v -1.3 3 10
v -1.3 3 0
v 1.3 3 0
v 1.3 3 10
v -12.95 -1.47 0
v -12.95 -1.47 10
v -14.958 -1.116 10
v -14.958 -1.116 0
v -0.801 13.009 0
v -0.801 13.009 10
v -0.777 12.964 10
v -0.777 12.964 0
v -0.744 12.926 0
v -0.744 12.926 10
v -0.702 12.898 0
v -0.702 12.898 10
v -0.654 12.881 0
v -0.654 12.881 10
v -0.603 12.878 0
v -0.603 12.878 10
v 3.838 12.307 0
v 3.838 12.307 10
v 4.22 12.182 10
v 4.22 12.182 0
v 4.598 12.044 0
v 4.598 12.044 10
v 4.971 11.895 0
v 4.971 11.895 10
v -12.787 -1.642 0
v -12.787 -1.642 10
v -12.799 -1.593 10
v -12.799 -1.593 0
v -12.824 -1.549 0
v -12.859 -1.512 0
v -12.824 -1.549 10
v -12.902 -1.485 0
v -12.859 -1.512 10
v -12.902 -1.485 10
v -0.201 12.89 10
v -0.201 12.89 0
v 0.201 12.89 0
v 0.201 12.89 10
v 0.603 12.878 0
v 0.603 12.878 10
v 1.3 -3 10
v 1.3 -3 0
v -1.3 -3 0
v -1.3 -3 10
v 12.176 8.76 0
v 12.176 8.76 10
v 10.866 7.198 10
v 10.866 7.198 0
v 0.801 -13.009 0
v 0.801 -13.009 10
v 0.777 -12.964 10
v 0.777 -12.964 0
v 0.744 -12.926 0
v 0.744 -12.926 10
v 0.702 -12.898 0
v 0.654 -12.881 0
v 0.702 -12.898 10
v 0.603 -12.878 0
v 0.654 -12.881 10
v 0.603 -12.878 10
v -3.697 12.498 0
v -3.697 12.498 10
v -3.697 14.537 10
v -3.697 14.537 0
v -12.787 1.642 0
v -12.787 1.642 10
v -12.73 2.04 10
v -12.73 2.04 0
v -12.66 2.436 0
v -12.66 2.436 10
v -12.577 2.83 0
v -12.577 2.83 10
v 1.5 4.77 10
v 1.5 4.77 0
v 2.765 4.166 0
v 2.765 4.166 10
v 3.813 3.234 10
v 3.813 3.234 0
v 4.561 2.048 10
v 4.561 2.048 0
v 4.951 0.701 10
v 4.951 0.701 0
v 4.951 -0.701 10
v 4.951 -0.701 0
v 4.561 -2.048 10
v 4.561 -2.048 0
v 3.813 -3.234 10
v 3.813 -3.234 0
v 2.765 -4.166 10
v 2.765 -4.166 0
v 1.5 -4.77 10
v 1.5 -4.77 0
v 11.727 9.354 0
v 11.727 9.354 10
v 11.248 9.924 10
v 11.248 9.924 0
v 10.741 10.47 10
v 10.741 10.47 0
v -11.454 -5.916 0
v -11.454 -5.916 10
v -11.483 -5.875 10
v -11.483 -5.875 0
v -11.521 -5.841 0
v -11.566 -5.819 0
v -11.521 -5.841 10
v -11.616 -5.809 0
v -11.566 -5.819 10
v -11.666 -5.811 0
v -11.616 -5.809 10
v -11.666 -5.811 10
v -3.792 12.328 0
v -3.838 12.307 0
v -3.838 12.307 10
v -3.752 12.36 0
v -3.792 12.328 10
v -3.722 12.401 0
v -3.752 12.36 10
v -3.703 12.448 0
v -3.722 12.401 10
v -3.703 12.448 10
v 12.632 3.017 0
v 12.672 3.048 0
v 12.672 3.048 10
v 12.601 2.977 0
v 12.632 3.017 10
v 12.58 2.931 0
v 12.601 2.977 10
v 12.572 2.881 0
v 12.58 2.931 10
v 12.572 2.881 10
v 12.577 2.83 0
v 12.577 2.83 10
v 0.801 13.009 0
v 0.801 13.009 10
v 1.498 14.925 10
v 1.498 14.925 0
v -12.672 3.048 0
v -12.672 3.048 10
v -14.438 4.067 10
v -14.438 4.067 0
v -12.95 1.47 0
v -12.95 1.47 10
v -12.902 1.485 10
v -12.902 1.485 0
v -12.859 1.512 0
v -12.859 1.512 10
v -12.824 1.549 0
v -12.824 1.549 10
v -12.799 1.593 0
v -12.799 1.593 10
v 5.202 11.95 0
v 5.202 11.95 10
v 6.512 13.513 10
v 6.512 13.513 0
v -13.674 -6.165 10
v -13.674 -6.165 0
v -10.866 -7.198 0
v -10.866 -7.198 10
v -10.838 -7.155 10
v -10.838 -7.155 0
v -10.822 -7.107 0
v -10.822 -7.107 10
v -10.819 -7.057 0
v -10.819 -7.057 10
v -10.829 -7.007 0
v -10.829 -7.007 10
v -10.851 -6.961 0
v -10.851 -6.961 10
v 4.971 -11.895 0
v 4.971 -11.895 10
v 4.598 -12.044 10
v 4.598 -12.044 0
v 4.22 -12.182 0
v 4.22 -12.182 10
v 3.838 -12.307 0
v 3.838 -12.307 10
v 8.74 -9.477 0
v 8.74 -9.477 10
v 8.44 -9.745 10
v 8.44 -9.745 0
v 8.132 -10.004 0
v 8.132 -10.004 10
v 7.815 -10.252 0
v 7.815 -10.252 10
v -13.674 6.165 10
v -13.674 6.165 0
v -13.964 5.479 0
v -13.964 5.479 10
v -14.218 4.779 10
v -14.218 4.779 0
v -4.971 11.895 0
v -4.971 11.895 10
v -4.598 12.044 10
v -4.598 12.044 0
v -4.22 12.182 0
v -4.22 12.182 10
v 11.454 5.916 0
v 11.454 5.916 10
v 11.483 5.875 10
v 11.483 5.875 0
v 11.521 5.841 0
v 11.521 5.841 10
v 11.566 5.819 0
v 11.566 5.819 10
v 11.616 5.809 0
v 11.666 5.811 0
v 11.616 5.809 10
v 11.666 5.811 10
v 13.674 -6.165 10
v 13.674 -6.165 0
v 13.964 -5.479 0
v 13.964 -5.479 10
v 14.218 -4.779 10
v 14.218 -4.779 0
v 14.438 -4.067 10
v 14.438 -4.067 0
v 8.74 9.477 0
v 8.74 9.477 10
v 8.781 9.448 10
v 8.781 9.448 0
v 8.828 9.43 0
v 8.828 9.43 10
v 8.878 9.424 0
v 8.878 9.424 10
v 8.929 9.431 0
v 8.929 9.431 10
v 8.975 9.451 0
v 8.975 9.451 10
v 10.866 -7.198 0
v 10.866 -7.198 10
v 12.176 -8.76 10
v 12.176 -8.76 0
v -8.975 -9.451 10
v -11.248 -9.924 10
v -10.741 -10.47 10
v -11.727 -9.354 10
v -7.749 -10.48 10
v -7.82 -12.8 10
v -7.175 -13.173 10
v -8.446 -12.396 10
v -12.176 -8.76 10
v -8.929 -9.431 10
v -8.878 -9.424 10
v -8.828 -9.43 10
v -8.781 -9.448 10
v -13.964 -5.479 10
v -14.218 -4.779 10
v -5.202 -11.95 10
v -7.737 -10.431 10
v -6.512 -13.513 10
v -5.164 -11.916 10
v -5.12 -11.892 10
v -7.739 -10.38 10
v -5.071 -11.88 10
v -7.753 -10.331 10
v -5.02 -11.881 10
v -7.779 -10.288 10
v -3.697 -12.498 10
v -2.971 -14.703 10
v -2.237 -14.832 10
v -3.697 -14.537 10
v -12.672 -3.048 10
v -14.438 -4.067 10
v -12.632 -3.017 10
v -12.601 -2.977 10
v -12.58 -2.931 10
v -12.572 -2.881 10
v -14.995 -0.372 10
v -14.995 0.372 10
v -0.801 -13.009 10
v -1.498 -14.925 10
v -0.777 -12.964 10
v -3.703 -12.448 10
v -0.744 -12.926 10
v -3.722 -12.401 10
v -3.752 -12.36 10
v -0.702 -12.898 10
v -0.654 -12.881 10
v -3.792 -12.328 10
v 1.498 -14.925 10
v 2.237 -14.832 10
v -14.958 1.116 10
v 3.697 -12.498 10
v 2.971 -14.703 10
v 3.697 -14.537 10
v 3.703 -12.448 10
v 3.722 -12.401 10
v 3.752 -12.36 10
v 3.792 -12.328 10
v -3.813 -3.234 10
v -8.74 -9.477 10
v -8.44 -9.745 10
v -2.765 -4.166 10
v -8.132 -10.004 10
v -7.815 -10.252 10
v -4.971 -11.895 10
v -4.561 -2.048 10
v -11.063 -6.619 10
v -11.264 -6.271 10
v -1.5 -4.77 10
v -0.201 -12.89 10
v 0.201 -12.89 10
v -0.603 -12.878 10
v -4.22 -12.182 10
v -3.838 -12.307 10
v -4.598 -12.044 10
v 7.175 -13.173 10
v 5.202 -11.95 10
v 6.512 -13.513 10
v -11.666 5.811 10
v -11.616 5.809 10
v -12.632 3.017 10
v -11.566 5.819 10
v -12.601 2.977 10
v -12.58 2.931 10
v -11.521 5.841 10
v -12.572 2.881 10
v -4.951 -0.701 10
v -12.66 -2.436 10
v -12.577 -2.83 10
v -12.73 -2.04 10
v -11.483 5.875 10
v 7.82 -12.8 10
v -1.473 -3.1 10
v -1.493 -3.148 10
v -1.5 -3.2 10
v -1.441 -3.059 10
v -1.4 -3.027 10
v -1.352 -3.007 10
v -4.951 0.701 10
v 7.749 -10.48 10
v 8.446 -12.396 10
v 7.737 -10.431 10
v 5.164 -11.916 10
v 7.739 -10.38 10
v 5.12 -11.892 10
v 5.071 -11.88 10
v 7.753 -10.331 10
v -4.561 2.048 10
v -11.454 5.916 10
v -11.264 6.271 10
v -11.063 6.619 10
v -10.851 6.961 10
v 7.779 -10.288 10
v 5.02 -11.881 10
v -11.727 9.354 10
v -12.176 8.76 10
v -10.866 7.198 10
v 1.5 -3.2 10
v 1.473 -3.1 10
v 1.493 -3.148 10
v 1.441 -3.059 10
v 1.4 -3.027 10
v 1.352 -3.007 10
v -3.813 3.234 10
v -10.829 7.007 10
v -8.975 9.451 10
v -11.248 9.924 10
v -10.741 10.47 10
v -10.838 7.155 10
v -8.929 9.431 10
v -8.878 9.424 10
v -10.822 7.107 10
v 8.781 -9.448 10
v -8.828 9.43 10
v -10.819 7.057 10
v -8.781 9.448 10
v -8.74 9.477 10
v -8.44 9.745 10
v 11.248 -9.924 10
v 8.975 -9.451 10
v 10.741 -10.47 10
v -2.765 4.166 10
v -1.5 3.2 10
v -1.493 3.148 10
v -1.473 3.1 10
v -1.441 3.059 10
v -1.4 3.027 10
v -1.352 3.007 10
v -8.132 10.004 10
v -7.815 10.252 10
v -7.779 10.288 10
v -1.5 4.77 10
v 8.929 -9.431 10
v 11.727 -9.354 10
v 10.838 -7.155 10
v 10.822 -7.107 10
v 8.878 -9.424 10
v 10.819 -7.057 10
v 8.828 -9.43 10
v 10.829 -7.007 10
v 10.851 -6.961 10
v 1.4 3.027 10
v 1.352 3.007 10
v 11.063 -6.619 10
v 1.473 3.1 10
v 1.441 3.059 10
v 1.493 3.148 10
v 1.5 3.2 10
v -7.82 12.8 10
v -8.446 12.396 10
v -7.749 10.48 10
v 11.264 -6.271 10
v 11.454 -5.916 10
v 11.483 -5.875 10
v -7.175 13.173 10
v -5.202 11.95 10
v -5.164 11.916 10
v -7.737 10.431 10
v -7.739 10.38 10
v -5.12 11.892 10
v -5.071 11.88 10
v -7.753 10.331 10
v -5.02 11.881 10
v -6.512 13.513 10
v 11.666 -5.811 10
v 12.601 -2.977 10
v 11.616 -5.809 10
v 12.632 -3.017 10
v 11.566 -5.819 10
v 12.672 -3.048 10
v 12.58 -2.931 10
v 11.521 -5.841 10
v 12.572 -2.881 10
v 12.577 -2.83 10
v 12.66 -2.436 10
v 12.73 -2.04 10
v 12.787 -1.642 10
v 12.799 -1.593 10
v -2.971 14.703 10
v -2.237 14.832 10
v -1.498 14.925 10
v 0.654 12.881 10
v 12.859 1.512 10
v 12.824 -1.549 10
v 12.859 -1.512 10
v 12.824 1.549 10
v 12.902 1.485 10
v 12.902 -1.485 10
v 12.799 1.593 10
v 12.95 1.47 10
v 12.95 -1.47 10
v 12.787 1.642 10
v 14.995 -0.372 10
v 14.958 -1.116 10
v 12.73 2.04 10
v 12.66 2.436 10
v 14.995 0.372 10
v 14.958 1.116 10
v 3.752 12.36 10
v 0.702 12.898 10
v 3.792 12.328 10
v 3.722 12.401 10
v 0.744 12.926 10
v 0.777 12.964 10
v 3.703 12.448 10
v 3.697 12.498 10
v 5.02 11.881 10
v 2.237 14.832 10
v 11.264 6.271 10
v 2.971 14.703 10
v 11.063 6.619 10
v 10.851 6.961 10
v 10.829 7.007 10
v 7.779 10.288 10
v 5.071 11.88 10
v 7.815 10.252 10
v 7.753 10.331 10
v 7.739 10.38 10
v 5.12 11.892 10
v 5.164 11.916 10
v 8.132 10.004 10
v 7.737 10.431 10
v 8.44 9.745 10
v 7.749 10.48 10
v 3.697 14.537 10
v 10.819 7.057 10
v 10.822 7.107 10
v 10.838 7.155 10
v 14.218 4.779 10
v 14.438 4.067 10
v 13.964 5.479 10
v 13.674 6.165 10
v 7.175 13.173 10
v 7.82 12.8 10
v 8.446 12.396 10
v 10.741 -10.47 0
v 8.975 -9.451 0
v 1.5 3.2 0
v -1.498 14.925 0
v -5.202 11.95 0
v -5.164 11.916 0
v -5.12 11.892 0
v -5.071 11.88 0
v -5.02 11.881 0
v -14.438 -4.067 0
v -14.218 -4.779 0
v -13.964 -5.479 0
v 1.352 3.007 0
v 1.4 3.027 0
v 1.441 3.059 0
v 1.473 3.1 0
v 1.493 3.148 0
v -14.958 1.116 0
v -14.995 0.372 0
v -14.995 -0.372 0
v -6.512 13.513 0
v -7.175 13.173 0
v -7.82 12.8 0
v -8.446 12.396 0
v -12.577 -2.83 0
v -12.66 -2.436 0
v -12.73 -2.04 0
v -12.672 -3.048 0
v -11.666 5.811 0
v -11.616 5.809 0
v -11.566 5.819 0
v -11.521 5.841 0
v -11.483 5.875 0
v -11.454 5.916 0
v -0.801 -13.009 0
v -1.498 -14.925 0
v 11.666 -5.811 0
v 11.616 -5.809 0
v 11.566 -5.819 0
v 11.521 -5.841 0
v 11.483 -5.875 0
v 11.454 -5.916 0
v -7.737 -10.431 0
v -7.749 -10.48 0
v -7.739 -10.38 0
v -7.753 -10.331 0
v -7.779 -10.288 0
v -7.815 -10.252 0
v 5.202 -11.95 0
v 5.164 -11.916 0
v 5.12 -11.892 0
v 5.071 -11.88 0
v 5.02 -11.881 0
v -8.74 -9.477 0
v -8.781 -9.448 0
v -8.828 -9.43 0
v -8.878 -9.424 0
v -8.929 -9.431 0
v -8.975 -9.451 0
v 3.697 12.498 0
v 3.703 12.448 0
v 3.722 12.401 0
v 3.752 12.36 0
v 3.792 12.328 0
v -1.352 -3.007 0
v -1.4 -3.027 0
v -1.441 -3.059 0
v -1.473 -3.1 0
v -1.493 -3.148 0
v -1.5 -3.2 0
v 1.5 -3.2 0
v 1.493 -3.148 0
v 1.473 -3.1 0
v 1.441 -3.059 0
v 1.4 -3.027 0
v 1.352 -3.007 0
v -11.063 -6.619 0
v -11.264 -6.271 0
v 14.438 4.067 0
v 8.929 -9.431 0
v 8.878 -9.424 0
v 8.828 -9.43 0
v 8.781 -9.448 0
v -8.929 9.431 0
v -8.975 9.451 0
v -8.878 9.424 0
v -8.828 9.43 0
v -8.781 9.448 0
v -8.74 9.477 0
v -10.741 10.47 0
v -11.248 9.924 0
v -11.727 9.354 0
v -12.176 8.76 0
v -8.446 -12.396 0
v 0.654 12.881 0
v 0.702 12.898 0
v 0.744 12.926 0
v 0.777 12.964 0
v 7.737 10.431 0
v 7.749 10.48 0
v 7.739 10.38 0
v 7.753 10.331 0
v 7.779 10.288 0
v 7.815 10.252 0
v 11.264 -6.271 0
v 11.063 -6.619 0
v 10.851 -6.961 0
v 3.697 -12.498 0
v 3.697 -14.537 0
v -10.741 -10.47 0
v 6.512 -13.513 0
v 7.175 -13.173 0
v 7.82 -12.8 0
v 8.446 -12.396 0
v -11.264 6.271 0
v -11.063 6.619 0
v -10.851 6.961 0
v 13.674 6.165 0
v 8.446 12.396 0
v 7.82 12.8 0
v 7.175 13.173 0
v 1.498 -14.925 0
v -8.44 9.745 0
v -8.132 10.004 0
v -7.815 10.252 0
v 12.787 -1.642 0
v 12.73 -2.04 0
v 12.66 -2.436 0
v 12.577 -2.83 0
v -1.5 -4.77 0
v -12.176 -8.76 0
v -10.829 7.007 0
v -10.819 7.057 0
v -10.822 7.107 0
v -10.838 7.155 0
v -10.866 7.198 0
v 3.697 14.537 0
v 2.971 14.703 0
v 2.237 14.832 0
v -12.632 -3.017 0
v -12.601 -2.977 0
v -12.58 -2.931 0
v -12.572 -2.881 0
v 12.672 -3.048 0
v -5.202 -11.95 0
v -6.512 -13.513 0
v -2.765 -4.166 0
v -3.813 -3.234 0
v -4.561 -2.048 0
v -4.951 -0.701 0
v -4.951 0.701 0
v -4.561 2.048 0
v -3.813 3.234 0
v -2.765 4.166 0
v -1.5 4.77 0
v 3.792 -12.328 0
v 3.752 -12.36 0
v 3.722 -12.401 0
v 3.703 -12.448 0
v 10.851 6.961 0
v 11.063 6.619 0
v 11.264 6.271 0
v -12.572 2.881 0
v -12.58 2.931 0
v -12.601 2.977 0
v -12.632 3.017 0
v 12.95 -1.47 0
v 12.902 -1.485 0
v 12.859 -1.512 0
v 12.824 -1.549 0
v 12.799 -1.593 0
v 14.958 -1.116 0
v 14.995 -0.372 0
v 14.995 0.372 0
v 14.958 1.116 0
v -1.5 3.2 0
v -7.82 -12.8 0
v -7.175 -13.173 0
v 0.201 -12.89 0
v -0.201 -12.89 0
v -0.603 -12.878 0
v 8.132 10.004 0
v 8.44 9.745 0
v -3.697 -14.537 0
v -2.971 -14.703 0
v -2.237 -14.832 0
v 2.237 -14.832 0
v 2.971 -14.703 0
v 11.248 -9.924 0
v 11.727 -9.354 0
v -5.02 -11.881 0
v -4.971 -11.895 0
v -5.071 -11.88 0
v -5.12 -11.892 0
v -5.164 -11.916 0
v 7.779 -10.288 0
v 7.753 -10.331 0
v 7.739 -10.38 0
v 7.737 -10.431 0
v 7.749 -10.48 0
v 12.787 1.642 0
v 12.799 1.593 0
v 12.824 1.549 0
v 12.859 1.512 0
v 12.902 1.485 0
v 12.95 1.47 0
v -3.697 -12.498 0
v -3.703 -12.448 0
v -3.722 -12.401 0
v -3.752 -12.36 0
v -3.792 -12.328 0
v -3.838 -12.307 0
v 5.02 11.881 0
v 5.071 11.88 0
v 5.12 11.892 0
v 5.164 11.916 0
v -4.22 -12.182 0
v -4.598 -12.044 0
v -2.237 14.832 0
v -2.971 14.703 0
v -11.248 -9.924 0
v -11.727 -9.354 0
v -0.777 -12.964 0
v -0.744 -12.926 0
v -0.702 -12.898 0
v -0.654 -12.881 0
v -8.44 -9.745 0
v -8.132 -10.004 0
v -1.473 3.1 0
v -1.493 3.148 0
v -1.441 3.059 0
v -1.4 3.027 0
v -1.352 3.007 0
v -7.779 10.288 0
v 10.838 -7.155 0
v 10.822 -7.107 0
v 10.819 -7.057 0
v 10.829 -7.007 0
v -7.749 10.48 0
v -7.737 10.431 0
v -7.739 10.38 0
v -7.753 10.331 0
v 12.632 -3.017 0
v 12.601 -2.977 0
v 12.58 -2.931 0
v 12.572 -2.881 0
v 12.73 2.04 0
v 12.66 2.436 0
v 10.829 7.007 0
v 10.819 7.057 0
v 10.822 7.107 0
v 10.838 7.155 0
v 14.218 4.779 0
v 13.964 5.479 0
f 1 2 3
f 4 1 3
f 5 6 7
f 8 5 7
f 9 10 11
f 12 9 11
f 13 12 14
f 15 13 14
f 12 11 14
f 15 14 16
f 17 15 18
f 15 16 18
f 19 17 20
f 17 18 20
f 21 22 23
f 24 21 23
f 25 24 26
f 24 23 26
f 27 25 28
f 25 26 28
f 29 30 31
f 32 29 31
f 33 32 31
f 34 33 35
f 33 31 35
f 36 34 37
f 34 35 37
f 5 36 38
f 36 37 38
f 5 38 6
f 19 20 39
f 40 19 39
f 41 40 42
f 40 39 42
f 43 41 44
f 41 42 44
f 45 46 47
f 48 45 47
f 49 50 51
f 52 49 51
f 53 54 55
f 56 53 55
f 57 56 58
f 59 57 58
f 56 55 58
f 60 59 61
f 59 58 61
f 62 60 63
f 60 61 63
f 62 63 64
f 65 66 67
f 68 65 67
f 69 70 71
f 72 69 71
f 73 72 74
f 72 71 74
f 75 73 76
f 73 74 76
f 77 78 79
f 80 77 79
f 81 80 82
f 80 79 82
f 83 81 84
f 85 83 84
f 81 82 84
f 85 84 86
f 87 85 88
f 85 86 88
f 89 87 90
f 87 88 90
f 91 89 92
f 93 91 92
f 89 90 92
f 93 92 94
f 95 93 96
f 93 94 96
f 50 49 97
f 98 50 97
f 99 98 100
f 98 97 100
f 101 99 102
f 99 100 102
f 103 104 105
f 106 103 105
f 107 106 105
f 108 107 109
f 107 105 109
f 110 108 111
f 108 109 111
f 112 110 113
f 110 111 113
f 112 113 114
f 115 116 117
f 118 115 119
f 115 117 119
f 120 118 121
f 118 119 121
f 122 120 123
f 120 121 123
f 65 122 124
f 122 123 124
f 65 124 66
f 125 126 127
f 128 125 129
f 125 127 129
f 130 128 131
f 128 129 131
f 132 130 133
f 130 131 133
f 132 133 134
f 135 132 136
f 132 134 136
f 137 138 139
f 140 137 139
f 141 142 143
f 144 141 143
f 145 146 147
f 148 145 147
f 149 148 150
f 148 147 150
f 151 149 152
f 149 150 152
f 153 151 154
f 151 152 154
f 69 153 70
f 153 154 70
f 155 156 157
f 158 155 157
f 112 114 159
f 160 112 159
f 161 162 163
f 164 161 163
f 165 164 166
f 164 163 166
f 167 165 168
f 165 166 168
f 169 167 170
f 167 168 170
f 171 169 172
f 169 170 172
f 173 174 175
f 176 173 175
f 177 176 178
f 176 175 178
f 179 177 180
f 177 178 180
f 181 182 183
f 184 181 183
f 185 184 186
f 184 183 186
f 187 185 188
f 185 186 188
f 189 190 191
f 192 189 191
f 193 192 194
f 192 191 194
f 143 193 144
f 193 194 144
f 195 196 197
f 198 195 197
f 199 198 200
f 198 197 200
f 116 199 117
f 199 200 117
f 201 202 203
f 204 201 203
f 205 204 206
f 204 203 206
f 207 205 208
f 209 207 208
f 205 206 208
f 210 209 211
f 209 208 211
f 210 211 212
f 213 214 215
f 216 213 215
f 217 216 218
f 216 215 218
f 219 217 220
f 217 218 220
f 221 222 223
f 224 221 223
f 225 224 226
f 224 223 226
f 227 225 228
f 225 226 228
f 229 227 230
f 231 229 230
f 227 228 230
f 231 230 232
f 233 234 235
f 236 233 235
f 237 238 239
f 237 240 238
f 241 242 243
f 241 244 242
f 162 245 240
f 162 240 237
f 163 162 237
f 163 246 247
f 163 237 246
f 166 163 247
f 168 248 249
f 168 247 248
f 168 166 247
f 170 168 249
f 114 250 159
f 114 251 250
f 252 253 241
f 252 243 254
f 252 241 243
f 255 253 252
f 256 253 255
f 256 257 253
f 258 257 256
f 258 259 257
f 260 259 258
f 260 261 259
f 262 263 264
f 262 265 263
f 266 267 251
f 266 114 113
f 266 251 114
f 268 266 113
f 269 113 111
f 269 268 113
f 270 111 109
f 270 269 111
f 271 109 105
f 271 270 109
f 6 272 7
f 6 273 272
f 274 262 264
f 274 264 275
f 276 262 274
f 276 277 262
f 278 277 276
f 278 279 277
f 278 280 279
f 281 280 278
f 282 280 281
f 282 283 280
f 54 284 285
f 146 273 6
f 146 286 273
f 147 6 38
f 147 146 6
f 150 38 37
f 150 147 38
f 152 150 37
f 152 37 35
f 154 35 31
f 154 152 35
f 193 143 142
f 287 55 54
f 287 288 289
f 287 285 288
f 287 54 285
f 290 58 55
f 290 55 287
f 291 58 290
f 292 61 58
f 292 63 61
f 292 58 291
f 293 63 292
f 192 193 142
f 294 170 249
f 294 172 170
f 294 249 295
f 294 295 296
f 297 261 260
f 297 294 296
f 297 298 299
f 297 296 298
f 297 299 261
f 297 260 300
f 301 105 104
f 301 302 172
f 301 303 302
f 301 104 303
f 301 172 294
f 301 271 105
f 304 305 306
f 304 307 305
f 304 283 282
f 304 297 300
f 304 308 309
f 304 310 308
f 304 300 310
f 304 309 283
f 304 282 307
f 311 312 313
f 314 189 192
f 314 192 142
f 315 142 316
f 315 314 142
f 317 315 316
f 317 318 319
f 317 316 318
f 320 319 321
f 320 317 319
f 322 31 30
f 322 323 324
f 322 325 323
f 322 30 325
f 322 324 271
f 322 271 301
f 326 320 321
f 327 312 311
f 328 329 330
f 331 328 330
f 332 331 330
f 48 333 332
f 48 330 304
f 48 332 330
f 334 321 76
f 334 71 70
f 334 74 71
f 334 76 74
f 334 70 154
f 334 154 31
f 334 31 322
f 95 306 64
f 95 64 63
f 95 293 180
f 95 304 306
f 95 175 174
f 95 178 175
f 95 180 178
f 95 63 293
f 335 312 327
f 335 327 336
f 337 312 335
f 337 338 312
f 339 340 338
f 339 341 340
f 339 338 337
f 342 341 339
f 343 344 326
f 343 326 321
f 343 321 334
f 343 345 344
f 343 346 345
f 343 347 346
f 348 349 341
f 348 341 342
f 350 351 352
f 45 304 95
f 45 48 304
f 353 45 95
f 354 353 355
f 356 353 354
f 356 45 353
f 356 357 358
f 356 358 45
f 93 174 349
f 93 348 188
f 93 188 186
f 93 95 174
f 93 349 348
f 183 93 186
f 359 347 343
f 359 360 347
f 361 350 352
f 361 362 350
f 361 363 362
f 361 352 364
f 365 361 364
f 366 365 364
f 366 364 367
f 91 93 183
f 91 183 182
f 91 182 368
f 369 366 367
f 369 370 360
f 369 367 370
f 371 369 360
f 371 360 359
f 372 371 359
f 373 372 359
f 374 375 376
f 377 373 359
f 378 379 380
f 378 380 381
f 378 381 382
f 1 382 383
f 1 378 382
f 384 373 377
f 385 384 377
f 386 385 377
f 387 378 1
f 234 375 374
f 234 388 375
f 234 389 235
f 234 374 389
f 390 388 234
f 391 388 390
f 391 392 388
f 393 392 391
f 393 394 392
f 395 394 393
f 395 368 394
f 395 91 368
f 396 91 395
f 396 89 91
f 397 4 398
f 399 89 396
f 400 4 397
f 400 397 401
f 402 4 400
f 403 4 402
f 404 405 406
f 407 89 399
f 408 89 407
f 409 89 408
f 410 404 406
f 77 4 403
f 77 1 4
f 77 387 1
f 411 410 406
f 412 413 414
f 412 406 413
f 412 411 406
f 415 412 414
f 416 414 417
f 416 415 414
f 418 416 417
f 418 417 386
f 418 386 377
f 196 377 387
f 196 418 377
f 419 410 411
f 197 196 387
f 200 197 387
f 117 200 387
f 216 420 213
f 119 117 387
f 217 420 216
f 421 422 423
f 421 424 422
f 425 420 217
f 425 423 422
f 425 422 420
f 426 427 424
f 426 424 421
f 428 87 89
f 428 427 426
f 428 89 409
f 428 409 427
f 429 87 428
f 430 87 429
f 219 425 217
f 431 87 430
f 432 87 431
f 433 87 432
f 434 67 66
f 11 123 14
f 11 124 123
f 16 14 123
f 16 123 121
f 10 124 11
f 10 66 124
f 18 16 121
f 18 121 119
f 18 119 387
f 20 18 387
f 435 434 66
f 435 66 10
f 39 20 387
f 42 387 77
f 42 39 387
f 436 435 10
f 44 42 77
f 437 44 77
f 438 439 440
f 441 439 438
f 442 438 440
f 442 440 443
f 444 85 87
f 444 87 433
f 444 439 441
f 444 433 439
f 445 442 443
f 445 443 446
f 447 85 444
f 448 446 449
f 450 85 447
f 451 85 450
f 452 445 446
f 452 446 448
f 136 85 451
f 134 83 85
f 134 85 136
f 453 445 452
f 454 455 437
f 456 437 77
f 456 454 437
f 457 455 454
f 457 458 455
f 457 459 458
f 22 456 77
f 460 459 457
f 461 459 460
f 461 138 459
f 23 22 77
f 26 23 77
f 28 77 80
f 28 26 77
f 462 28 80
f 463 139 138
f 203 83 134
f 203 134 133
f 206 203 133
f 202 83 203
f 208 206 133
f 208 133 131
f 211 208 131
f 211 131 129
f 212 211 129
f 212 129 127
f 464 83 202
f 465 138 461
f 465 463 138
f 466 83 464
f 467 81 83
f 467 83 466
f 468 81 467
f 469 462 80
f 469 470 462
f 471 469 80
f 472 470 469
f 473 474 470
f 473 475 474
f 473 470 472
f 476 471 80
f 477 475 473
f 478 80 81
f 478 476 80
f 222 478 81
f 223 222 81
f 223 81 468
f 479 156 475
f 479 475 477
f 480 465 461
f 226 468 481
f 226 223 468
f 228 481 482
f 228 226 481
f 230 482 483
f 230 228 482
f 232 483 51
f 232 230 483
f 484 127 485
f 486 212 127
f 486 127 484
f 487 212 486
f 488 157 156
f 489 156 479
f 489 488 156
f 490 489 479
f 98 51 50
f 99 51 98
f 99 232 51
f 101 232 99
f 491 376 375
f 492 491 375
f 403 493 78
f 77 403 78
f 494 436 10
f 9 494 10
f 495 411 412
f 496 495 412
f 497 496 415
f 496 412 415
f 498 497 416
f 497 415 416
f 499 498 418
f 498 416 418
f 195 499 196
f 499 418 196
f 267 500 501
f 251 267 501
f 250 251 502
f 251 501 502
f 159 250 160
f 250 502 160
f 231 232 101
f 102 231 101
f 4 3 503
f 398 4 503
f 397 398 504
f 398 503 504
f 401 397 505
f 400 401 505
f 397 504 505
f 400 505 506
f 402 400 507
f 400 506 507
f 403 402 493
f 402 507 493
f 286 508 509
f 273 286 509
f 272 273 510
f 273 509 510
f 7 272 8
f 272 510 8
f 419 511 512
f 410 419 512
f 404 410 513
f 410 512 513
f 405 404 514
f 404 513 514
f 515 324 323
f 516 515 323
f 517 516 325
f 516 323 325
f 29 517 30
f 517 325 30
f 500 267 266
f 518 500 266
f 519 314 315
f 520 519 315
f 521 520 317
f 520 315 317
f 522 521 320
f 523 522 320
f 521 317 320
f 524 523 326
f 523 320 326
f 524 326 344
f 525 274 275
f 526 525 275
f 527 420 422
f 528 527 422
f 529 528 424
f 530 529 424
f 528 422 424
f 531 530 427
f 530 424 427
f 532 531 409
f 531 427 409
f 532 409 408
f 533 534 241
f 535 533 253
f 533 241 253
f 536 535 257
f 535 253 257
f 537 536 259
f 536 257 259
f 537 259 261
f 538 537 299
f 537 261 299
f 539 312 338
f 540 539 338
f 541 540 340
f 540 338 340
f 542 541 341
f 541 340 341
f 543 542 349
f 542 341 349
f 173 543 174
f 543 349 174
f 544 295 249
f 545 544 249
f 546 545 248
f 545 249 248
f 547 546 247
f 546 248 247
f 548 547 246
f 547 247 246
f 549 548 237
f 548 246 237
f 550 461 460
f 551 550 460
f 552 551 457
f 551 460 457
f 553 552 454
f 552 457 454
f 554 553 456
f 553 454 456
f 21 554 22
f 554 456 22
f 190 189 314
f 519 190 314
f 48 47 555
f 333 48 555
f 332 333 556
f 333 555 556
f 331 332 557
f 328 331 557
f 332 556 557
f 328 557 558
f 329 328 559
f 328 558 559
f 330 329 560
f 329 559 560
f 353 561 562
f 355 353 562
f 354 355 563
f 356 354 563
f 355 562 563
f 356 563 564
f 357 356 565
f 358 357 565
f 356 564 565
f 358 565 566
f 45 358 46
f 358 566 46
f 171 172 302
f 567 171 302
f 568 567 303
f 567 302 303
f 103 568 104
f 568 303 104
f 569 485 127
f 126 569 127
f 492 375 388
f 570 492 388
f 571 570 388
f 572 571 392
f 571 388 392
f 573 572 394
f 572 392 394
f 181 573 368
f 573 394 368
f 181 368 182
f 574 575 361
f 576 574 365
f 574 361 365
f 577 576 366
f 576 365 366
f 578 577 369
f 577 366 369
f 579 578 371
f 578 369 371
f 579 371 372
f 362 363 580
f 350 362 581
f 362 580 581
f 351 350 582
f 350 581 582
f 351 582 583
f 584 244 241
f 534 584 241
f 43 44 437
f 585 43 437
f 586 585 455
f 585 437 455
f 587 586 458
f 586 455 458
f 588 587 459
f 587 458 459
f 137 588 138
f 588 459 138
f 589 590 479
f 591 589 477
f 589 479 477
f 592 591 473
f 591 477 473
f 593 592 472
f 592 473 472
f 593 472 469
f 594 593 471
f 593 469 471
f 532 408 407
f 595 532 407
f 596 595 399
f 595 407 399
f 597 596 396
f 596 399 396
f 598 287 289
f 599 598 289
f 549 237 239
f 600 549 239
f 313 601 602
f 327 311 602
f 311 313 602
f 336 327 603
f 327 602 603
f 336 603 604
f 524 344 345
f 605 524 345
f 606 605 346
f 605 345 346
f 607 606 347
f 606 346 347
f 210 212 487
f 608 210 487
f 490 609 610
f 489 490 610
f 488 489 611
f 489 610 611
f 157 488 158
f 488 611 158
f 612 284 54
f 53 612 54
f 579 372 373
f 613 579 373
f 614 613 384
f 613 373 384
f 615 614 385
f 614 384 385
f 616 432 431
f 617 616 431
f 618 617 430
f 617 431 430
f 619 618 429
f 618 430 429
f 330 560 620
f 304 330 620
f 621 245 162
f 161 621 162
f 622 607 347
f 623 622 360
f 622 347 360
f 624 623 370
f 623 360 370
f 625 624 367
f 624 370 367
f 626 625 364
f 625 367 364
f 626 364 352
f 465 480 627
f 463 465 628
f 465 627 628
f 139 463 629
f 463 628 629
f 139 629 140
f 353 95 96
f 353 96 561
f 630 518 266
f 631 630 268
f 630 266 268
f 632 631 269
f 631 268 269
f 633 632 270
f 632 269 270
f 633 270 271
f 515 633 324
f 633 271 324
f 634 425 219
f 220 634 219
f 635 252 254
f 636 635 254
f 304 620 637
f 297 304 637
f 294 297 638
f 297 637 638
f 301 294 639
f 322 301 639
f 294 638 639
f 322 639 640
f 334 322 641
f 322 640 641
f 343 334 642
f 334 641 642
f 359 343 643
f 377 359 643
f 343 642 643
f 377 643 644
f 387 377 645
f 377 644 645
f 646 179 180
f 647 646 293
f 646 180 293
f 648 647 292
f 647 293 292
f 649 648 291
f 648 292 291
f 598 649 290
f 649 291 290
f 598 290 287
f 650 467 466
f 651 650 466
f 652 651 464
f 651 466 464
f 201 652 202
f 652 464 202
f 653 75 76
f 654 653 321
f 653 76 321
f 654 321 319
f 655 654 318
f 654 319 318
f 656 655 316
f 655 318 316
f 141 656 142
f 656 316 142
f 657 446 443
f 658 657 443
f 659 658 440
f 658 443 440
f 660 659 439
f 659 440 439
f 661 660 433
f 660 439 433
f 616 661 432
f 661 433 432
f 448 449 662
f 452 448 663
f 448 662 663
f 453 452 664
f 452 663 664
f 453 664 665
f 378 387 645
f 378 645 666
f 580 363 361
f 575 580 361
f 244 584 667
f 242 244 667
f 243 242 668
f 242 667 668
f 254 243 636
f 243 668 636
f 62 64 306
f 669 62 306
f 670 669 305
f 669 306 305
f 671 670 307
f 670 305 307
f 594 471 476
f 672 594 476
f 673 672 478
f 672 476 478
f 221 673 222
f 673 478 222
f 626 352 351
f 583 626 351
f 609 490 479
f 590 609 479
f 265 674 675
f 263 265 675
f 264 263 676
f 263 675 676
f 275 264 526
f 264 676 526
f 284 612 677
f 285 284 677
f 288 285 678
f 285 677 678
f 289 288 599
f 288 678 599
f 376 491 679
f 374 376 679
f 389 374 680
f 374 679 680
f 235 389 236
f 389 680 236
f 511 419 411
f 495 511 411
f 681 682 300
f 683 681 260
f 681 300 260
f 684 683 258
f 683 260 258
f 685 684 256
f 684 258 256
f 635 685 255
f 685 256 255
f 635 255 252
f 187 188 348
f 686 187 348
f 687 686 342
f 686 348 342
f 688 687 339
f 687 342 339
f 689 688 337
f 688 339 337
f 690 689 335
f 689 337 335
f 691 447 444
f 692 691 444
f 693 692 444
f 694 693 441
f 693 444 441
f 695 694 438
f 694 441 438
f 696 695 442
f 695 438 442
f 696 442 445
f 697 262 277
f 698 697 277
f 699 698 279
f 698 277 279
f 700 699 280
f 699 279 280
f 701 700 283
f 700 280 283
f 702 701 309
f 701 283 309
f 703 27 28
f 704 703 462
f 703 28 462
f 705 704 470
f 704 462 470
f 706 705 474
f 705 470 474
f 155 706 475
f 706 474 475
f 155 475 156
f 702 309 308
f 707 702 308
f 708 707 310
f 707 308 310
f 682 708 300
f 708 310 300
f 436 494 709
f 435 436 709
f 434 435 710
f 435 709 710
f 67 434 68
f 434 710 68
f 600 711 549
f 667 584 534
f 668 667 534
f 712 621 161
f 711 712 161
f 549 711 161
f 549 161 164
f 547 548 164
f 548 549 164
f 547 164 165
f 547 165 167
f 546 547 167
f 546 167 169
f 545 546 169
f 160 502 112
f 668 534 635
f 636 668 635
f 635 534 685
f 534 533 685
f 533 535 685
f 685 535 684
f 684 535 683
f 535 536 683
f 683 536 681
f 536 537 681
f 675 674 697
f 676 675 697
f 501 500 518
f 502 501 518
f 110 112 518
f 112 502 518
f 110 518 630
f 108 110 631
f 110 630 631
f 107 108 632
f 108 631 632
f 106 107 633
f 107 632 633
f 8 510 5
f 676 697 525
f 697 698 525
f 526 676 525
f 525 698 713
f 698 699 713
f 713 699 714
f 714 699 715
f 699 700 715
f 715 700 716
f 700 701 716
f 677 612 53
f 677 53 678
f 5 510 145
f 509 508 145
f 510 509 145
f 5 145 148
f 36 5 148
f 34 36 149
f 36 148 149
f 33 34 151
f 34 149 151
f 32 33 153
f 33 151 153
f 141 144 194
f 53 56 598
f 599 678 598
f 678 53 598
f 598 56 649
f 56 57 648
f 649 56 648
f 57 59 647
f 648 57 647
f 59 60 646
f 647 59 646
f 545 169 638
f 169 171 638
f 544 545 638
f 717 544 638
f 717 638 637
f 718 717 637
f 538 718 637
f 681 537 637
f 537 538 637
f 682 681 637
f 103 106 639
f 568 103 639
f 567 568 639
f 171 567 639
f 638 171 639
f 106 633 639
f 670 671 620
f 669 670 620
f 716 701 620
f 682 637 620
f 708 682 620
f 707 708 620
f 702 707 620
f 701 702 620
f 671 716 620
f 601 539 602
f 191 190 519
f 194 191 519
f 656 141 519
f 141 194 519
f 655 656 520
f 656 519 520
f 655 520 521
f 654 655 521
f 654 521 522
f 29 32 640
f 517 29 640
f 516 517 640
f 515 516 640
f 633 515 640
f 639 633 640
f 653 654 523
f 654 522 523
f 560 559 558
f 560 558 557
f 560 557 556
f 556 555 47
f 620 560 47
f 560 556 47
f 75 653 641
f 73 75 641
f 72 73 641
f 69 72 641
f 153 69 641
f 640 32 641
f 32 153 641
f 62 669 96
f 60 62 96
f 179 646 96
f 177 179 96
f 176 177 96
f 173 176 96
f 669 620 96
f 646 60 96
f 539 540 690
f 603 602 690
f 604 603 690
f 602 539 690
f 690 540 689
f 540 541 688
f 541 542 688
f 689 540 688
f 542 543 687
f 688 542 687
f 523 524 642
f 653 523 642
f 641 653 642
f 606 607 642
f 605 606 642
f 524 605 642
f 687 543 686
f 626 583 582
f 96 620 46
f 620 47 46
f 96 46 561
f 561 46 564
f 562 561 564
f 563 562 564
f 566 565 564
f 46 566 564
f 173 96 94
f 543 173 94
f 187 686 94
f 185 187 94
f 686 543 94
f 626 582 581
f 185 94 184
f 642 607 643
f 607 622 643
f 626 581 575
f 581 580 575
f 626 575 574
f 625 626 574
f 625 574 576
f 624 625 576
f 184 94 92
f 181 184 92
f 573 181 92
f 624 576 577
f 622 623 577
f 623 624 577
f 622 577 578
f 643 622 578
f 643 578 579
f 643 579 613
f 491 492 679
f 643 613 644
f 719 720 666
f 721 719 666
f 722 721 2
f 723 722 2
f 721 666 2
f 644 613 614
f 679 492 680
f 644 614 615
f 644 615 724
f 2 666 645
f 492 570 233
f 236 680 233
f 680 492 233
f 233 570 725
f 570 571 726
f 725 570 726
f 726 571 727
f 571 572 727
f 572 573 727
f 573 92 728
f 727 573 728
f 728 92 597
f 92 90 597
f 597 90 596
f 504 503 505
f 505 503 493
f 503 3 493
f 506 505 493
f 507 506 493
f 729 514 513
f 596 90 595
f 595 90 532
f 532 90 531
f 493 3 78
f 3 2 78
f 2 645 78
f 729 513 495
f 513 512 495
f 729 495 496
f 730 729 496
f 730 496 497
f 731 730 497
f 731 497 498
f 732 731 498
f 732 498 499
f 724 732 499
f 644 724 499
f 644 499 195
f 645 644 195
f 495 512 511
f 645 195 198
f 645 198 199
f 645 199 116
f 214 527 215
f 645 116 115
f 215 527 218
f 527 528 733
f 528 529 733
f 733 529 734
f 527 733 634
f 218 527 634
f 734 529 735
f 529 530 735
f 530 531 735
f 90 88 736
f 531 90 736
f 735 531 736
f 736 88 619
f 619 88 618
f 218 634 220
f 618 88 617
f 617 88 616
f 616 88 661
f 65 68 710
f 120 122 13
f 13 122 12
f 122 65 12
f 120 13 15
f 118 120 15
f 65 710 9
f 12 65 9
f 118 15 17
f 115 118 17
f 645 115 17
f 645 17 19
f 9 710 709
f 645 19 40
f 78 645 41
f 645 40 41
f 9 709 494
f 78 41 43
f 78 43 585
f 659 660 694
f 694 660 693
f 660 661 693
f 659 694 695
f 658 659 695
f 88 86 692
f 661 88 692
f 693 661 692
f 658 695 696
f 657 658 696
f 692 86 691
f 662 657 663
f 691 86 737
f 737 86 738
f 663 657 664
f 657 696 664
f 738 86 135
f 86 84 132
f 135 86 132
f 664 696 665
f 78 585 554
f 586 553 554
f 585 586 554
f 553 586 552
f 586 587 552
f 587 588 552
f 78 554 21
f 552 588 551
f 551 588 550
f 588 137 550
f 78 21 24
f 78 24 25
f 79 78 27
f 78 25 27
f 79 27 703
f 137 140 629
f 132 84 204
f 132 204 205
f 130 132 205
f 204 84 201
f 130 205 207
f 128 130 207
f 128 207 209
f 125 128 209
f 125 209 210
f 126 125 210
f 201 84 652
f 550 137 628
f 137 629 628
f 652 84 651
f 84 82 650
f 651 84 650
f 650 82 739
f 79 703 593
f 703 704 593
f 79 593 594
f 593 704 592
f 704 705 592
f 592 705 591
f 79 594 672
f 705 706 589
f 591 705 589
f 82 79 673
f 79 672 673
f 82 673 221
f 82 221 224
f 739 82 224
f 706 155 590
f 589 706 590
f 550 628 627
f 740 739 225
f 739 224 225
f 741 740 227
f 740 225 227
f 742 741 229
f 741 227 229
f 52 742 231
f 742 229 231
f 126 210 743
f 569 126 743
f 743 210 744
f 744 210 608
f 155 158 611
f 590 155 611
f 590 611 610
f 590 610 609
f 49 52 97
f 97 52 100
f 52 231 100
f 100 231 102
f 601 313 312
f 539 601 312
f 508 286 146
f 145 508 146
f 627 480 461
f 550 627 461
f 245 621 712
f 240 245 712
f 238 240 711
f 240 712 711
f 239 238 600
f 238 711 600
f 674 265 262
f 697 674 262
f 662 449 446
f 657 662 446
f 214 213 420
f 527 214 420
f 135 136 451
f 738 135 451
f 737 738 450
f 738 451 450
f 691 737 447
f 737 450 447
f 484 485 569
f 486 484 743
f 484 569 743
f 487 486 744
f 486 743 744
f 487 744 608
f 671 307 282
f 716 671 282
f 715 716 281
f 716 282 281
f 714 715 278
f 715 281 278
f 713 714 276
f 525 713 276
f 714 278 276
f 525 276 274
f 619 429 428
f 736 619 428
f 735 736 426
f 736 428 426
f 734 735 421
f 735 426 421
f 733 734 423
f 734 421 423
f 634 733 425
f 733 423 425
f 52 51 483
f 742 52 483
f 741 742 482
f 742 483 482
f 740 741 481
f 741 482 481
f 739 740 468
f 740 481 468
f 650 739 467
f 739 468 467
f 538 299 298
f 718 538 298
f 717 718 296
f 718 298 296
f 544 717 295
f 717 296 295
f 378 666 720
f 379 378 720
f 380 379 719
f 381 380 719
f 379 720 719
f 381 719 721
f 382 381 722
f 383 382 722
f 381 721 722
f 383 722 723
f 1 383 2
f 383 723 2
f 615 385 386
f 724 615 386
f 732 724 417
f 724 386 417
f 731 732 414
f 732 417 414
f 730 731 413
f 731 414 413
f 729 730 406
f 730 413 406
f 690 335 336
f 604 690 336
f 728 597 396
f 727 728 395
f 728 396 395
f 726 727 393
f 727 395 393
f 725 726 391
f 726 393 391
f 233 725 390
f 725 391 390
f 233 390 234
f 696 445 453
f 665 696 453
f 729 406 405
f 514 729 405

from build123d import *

# Parameters (mm, degrees)
F0_R     = 15
F1_DEPTH = 10
F3_DEPTH = 10.001
F4_COUNT = 18


with BuildPart() as f1:
    # F0 (on Top) → F1 (new body)
    with BuildSketch(Plane.XY):
        Circle(F0_R)
        with BuildLine():
            ThreePointArc((1.5, 4.7696960071), (5, 0), (1.5, -4.7696960071))
            Line((1.5, -4.7696960071), (1.5, -3.2))
            ThreePointArc((1.5, -3.2), (1.4414213562, -3.0585786438), (1.3, -3))
            Line((1.3, -3), (-1.3, -3))
            ThreePointArc((-1.3, -3), (-1.4414213562, -3.0585786438), (-1.5, -3.2))
            Line((-1.5, -3.2), (-1.5, -4.7696960071))
            ThreePointArc((-1.5, -4.7696960071), (-5, 0), (-1.5, 4.7696960071))
            Line((-1.5, 4.7696960071), (-1.5, 3.2))
            ThreePointArc((-1.5, 3.2), (-1.4414213562, 3.0585786438), (-1.3, 3))
            Line((-1.3, 3), (1.3, 3))
            ThreePointArc((1.3, 3), (1.4414213562, 3.0585786438), (1.5, 3.2))
            Line((1.5, 3.2), (1.5, 4.7696960071))
        make_face(mode=Mode.SUBTRACT)
    extrude(amount=F1_DEPTH)

    # F2 (on face) → F3 (cut, through all)
    with BuildSketch(Plane.XY.offset(10)):
        with BuildLine():
            ThreePointArc((0.6031215444, 12.8775082637), (0.7234998321, 12.9107243291), (0.8007100133, 13.0088712958))
            Line((0.8007100133, 13.0088712958), (1.4981238267, 14.925))
            ThreePointArc((1.4981238267, 14.925), (0, 15), (-1.4981238267, 14.925))
            Line((-1.4981238267, 14.925), (-0.8007100133, 13.0088712958))
            ThreePointArc((-0.8007100133, 13.0088712958), (-0.7234998321, 12.9107243291), (-0.6031215444, 12.8775082637))
            ThreePointArc((-0.6031215444, 12.8775082637), (0, 12.8920669658), (0.6031215444, 12.8775082637))
        make_face()
    f3 = extrude(amount=-F3_DEPTH, mode=Mode.SUBTRACT)

    # F4: F3 ×18 about axis
    f4_axis = Axis((0, 0, 0), (0, 0, -1))
    for i in range(1, F4_COUNT):
        add(f3.rotate(f4_axis, i * 360 / F4_COUNT), mode=Mode.SUBTRACT)


solid = f1.part
